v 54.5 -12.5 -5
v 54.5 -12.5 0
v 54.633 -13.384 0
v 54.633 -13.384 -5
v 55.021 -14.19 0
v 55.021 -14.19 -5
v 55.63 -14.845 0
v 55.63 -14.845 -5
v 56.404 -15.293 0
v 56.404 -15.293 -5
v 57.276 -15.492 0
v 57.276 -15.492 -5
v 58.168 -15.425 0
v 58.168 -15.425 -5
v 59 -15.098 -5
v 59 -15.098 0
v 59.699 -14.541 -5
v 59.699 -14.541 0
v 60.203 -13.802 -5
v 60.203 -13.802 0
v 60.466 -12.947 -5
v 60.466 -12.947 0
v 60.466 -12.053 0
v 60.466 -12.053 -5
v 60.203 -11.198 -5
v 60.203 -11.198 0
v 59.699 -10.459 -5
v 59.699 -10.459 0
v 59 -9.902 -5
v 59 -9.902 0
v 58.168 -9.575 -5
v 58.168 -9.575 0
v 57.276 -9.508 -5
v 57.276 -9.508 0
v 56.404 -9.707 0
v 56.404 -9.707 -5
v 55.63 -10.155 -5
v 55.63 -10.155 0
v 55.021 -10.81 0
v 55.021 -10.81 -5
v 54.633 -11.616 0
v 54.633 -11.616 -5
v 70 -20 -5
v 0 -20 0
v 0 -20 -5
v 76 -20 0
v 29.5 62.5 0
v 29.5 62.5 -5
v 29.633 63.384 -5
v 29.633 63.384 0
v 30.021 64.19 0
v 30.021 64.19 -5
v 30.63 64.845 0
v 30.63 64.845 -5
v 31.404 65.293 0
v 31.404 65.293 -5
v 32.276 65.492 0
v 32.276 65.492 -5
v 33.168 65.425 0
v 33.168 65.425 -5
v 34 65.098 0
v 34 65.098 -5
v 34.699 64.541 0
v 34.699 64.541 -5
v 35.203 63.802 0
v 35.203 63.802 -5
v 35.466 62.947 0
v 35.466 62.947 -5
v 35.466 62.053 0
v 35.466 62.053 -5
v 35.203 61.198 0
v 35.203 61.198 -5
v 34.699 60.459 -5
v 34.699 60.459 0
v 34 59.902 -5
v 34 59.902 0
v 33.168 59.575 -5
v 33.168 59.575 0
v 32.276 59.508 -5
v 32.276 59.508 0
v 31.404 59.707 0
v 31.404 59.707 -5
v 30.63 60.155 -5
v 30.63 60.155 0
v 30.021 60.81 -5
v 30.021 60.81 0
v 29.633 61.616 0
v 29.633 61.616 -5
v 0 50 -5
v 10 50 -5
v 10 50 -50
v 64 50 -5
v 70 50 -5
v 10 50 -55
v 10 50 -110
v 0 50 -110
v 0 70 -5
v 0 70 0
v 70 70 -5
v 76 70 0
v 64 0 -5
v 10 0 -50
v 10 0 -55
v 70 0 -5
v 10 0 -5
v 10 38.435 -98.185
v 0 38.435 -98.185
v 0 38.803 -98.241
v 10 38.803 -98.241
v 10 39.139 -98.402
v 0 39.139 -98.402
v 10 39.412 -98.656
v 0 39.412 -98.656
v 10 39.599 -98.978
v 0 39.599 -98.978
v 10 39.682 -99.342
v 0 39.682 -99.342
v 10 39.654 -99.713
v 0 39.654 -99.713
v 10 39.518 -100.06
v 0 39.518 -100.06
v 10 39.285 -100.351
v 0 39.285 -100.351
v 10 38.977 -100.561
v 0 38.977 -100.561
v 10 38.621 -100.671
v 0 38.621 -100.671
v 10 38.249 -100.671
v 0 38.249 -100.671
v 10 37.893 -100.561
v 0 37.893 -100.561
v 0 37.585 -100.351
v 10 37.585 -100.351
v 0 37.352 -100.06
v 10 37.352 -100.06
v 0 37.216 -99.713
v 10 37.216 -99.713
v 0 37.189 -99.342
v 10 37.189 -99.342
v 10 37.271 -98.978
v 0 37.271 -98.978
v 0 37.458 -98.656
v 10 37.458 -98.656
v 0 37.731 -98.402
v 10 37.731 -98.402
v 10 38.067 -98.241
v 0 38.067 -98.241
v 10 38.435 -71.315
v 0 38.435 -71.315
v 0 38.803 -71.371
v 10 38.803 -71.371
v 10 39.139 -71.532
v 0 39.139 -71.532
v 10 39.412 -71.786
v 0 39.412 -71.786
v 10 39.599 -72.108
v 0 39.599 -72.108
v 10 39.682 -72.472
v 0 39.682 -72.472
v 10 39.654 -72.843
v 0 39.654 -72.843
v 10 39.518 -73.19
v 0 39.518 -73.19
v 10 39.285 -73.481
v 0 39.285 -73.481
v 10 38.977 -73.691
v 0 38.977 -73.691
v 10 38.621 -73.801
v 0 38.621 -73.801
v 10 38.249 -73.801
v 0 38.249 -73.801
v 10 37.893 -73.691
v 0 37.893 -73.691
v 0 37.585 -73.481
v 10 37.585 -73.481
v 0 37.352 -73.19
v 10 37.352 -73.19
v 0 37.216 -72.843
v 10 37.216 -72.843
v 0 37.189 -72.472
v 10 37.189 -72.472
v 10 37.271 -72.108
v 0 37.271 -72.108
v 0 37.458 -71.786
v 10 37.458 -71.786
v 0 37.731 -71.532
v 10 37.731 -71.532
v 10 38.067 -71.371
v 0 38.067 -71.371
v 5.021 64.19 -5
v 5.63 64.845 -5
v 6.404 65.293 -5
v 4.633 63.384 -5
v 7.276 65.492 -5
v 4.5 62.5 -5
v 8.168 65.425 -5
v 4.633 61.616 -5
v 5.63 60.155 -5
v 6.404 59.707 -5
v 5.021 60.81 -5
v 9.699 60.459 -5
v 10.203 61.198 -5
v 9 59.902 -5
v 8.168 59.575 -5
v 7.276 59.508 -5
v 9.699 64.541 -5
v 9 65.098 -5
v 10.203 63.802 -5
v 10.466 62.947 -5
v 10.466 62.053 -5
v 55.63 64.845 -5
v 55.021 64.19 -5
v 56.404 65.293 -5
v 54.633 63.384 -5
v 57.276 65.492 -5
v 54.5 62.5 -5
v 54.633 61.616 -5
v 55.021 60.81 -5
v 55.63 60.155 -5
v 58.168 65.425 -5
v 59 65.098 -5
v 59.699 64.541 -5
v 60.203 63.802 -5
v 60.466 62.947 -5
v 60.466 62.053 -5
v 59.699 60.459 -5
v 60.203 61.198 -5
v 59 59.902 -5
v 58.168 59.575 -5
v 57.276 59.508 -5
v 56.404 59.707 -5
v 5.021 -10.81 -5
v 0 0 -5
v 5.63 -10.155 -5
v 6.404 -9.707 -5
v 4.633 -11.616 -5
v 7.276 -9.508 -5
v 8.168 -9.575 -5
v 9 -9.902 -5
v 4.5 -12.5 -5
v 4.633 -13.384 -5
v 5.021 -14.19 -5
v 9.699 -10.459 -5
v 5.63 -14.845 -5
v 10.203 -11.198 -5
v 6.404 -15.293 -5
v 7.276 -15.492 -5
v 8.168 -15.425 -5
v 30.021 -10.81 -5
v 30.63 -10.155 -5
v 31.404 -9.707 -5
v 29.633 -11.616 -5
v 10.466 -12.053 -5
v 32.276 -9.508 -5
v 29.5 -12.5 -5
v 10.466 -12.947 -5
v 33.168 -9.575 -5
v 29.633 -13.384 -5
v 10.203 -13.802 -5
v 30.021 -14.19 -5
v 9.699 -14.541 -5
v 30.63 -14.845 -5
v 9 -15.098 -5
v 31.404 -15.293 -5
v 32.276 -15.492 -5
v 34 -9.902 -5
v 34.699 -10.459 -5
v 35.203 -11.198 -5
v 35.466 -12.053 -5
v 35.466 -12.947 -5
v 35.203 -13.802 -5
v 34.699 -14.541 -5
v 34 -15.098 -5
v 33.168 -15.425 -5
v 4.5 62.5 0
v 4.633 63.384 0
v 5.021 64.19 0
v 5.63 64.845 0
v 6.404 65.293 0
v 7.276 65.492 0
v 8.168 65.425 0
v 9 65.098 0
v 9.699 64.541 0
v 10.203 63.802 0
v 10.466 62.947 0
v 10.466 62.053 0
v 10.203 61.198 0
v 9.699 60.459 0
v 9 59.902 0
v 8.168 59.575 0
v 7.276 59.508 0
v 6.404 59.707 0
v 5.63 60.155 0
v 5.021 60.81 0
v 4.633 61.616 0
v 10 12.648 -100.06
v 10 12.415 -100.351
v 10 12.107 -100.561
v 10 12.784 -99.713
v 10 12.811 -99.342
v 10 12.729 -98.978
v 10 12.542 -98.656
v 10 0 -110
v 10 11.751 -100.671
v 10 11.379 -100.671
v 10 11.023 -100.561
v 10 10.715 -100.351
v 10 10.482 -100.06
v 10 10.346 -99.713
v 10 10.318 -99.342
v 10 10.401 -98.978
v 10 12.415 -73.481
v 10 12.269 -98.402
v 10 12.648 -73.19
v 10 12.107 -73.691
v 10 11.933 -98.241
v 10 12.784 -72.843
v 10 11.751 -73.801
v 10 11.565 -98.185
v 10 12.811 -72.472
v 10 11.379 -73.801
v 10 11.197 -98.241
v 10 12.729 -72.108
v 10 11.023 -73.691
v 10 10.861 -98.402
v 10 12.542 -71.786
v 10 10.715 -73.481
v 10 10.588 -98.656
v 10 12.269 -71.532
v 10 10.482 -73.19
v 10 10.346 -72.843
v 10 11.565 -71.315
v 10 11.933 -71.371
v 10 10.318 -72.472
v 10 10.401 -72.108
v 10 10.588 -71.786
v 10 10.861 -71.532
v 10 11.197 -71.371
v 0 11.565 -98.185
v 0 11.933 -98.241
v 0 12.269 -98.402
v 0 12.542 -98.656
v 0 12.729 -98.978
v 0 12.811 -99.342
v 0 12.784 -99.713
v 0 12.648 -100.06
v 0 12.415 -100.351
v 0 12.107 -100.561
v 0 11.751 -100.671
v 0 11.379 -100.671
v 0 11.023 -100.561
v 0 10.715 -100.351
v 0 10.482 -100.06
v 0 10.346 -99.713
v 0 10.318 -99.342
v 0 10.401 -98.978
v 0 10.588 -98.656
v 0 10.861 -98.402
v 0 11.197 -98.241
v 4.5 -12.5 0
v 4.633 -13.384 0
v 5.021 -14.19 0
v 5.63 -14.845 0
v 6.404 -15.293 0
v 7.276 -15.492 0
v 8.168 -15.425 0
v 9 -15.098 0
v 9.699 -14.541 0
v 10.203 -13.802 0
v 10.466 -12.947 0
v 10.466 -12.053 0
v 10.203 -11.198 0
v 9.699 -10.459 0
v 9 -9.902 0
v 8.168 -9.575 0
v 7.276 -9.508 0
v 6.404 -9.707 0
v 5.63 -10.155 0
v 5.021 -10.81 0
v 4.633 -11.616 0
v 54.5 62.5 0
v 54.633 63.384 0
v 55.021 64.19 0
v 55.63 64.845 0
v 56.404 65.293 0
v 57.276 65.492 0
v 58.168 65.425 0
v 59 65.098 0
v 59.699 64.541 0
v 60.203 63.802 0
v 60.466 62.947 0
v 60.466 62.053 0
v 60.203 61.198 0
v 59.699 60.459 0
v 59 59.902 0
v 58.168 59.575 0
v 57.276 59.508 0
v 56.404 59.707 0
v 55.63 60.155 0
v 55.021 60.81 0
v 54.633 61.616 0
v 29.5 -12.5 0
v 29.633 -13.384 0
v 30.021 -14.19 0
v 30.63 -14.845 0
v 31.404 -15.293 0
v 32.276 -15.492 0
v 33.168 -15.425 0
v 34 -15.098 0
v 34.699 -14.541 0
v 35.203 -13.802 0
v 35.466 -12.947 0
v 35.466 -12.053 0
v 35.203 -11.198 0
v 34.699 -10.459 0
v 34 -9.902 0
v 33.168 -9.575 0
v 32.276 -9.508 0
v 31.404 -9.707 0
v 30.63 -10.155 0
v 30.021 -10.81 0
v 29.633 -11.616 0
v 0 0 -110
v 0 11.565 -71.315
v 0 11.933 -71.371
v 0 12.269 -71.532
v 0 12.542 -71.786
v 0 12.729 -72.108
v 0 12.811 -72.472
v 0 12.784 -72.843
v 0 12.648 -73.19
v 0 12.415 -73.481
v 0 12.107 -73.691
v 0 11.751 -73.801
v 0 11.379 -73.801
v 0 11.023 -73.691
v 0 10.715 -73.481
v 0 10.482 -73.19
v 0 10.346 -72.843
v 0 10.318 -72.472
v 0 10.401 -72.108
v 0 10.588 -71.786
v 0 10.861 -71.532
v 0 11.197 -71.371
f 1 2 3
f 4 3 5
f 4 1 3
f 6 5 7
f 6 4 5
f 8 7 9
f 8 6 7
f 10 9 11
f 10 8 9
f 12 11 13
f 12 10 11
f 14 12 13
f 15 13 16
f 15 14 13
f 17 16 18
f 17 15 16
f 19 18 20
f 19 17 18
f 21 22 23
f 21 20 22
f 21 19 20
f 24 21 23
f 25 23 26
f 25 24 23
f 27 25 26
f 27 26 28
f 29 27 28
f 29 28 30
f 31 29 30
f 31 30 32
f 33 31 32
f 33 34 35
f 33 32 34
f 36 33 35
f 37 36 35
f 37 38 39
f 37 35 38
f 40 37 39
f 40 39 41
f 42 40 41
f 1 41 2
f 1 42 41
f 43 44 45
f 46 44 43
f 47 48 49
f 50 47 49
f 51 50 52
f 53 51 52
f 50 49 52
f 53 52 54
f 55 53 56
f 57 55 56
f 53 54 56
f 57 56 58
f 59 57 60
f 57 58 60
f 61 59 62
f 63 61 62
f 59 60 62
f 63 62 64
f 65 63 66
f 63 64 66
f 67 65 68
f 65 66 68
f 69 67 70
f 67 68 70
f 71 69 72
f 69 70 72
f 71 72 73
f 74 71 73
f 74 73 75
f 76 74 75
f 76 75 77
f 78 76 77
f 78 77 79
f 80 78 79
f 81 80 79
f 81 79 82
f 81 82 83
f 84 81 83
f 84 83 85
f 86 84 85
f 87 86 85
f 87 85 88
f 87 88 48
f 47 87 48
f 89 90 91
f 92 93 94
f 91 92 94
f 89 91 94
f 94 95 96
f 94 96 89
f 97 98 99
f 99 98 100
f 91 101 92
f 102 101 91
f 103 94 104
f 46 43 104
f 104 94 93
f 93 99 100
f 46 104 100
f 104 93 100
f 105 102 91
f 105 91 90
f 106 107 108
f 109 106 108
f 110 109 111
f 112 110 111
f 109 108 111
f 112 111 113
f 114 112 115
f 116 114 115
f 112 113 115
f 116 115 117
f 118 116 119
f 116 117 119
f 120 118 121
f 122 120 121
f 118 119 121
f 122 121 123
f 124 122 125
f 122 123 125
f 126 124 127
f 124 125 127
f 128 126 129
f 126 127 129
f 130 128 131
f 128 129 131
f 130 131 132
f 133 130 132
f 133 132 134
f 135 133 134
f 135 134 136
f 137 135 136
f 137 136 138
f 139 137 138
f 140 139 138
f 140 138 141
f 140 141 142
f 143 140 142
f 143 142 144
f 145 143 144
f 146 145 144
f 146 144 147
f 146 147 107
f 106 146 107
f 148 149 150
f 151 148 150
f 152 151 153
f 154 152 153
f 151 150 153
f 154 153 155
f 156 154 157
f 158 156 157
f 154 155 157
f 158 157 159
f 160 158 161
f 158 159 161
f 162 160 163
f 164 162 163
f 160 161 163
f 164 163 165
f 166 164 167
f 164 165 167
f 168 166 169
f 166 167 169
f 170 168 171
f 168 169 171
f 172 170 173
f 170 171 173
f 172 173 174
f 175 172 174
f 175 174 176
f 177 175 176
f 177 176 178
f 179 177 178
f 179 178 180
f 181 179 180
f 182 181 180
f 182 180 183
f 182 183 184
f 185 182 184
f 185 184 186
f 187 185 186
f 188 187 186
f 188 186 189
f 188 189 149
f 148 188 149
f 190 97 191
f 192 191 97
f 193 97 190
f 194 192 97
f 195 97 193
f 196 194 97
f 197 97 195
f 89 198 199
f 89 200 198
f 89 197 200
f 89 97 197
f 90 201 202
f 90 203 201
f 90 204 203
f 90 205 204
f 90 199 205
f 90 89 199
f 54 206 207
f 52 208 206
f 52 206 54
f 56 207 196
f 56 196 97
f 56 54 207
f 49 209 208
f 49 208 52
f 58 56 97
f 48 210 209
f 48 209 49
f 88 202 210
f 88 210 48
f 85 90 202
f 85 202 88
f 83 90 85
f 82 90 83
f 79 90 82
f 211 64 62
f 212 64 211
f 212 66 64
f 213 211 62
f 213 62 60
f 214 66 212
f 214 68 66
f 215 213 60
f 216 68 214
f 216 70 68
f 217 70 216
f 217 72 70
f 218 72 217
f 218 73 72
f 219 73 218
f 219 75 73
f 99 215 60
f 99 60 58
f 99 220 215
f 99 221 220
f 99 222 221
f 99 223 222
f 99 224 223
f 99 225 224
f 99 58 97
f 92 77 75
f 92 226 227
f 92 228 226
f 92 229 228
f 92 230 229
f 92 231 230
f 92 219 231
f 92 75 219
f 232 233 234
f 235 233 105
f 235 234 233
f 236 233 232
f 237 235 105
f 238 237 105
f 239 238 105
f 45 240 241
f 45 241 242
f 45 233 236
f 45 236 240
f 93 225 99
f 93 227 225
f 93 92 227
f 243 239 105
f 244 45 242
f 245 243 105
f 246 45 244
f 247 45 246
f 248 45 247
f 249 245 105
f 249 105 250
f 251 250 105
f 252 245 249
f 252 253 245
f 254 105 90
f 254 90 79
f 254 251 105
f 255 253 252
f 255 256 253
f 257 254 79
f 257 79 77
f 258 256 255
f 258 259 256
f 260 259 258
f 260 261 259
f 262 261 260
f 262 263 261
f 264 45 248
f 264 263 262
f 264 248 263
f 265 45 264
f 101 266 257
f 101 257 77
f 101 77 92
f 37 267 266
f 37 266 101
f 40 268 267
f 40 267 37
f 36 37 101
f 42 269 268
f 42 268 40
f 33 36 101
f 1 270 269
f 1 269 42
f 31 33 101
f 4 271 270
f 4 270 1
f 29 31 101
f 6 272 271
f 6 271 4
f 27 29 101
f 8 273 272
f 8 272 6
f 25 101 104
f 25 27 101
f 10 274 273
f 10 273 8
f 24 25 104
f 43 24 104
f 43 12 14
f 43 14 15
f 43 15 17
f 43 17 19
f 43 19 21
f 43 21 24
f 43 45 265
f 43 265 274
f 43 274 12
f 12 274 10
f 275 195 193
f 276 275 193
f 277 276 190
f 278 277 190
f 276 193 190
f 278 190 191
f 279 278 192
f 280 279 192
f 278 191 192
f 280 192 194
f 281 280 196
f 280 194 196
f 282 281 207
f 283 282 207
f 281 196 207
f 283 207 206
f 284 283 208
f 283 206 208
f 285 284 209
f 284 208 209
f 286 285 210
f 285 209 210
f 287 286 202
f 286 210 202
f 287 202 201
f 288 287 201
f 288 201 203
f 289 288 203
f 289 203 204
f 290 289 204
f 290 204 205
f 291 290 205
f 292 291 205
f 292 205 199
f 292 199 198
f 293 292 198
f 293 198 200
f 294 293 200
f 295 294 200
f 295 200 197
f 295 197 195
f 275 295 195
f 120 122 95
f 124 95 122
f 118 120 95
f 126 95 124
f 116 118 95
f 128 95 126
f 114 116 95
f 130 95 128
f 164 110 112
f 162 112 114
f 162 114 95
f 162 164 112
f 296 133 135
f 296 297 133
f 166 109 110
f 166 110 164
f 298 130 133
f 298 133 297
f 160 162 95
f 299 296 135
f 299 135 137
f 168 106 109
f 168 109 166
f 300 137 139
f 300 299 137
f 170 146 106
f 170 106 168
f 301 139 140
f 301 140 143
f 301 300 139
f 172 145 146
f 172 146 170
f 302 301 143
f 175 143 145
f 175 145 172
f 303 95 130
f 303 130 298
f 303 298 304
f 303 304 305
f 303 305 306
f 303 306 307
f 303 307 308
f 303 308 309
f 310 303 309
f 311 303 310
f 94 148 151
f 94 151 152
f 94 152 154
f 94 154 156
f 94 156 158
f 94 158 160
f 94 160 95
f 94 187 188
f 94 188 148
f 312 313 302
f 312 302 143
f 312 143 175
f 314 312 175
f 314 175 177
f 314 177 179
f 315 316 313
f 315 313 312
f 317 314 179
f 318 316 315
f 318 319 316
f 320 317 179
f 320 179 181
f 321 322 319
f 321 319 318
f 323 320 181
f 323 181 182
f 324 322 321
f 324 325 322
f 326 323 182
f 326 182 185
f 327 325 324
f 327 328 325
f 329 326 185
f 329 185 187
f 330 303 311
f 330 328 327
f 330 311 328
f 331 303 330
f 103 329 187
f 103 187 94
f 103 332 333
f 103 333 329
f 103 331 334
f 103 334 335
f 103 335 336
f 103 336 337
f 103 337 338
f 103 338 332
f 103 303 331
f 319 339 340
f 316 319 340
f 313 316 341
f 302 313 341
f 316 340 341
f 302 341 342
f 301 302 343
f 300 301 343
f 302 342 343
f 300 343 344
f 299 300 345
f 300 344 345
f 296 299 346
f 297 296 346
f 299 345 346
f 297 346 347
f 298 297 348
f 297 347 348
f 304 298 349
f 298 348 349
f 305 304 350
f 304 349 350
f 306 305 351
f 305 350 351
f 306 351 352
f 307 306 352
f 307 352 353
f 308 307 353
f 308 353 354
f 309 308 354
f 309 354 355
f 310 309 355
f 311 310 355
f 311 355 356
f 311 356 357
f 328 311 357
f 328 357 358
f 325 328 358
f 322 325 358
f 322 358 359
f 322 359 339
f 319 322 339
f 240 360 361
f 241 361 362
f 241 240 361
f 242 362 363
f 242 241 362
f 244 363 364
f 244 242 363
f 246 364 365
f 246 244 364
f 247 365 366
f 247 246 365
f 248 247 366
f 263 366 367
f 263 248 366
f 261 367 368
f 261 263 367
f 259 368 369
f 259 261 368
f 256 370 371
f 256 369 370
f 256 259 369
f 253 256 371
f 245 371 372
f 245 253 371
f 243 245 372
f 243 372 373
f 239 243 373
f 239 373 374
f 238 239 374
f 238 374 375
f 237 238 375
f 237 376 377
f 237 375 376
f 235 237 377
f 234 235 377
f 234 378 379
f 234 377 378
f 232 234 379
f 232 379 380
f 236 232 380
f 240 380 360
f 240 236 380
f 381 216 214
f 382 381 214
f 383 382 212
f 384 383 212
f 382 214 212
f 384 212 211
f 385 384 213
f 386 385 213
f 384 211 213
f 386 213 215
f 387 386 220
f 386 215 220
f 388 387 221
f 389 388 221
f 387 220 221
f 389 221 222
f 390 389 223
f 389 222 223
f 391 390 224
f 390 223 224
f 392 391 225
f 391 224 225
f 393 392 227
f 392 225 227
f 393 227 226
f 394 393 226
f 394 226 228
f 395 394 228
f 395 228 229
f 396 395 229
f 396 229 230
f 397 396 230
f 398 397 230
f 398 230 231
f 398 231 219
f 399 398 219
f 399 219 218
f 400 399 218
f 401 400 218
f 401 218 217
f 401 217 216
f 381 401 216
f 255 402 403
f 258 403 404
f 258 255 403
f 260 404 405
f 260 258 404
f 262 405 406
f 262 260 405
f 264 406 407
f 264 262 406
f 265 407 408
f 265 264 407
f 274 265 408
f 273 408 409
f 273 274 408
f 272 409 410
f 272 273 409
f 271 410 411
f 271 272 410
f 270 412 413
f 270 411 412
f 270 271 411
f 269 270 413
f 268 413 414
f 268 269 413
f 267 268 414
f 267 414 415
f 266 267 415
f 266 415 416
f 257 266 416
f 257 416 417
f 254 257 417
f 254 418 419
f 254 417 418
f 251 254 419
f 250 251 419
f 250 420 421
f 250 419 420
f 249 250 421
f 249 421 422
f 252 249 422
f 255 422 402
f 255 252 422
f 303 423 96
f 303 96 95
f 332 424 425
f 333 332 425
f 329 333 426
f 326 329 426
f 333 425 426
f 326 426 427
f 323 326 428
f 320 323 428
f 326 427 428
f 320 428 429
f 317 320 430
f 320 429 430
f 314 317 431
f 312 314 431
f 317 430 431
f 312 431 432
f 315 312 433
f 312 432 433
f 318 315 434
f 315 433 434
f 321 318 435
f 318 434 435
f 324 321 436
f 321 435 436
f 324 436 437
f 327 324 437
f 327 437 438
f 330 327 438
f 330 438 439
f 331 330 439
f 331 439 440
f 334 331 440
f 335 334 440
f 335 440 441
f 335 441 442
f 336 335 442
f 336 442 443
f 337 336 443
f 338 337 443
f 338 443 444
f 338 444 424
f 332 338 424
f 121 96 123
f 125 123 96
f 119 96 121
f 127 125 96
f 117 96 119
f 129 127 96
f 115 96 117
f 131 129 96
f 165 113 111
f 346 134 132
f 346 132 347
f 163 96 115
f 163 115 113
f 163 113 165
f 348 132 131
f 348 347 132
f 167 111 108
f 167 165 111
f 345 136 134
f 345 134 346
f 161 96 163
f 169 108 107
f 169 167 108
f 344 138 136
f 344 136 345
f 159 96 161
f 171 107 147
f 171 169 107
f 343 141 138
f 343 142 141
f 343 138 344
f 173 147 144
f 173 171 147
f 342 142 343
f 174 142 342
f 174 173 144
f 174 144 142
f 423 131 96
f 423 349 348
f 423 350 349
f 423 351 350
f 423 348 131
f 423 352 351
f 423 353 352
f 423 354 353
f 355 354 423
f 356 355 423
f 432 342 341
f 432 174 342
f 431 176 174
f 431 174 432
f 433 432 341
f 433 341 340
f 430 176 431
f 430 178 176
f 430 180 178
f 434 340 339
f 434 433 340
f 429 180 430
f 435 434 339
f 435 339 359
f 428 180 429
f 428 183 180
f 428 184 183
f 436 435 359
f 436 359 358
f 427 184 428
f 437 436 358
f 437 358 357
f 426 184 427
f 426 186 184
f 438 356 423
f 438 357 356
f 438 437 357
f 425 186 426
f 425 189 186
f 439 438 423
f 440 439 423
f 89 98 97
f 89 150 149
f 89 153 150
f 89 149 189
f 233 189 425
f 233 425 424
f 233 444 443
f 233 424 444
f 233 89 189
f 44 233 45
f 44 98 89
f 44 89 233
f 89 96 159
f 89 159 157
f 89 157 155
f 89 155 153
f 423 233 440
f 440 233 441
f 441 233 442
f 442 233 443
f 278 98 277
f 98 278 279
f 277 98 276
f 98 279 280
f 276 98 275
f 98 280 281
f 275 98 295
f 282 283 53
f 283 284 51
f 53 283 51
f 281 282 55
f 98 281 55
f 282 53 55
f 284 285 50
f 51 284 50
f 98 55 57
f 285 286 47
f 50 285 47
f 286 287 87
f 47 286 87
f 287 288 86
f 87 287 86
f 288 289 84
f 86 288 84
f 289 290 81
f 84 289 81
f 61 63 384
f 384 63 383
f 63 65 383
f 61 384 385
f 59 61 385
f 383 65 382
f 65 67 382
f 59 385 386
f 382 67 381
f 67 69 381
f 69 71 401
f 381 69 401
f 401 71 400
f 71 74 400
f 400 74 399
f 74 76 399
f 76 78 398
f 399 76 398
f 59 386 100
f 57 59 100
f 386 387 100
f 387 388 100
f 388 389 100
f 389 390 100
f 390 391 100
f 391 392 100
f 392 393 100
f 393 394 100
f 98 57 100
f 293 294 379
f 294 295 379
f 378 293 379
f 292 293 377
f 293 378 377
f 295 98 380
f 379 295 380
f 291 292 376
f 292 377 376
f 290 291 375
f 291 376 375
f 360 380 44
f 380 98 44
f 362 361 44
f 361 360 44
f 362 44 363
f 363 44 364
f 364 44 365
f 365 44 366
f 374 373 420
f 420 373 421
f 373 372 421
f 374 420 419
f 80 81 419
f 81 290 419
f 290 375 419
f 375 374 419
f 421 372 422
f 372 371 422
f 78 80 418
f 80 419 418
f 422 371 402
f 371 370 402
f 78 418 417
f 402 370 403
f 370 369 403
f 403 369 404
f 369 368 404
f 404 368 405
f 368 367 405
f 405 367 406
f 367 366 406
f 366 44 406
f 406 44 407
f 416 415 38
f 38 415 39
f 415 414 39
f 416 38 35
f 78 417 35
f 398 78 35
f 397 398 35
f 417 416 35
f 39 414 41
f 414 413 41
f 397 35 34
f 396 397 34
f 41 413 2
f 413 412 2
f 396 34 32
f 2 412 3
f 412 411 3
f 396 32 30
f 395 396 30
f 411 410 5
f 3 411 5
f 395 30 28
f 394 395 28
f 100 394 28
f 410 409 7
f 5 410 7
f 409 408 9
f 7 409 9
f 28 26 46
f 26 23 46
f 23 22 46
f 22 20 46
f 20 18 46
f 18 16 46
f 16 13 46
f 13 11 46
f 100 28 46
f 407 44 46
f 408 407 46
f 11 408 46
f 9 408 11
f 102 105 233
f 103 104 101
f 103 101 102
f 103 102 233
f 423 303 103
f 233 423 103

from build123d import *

# Parameters (mm, degrees)
EXTRUDE_1_DEPTH     = 50
SKETCH_2_W          = 76
SKETCH_2_H          = 20
EXTRUDE_2_DEPTH     = 5
CUT_EXTRUDE_1_DEPTH = 44
SKETCH_5_R          = 1.25
CUT_EXTRUDE_2_DEPTH = 77
SKETCH_6_R          = 3
CUT_EXTRUDE_3_DEPTH = 6


with BuildPart() as part:
    # 草图1 → 凸台-拉伸1 (new body)
    with BuildSketch(Plane(origin=(0, 0, 0), x_dir=(1, 0, 0), z_dir=(0, 1, 0))):
        Polygon((0, 0), (0, 110), (10, 110), (10, 55), (76, 0), (70, 0), (10, 0), align=None)
        Polygon((64, 5), (10, 50), (10, 5), align=None, mode=Mode.SUBTRACT)
    extrude(amount=EXTRUDE_1_DEPTH)

    # 草图2 → 凸台-拉伸2 (add)
    with BuildSketch(Plane.XY):
        with Locations((38, 60)):
            Rectangle(SKETCH_2_W, SKETCH_2_H)
    extrude_2 = extrude(amount=-EXTRUDE_2_DEPTH)

    # 草图3 → 切除-拉伸1 (cut)
    with BuildSketch(Plane.XZ.offset(-50)):
        Polygon((70, -5), (76, 0), (76, -5), align=None)
    cut_extrude_1 = extrude(amount=-CUT_EXTRUDE_1_DEPTH, mode=Mode.SUBTRACT)

    # 镜向1: 凸台-拉伸2, 切除-拉伸1 across plane
    add(extrude_2.mirror(Plane(origin=(0, 25, 0), x_dir=(0, 0, 1), z_dir=(0, -1, 0))))
    add(cut_extrude_1.mirror(Plane(origin=(0, 25, 0), x_dir=(0, 0, 1), z_dir=(0, -1, 0))), mode=Mode.SUBTRACT)

    # 草图5 → 切除-拉伸2 (cut, through all)
    with BuildSketch(Plane.ZY):
        with Locations((-72.564971157, 38.435028843)):
            Circle(SKETCH_5_R)
        with Locations((-72.564971157, 11.564971157)):
            Circle(SKETCH_5_R)
        with Locations((-99.435028843, 11.564971157)):
            Circle(SKETCH_5_R)
        with Locations((-99.435028843, 38.435028843)):
            Circle(SKETCH_5_R)
    extrude(amount=-CUT_EXTRUDE_2_DEPTH, mode=Mode.SUBTRACT)

    # 草图6 → 切除-拉伸3 (cut, through all)
    with BuildSketch(Plane(origin=(0, 0, -5), x_dir=(-1, 0, 0), z_dir=(0, 0, -1))):
        with Locations((-7.5, 62.5)):
            Circle(SKETCH_6_R)
        with Locations((-32.5, 62.5)):
            Circle(SKETCH_6_R)
        with Locations((-57.5, 62.5)):
            Circle(SKETCH_6_R)
    cut_extrude_3 = extrude(amount=-CUT_EXTRUDE_3_DEPTH, mode=Mode.SUBTRACT)

    # 镜向2: 切除-拉伸3 across plane
    add(cut_extrude_3.mirror(Plane(origin=(0, 25, 0), x_dir=(0, 0, 1), z_dir=(0, -1, 0))), mode=Mode.SUBTRACT)


solid = part.part
